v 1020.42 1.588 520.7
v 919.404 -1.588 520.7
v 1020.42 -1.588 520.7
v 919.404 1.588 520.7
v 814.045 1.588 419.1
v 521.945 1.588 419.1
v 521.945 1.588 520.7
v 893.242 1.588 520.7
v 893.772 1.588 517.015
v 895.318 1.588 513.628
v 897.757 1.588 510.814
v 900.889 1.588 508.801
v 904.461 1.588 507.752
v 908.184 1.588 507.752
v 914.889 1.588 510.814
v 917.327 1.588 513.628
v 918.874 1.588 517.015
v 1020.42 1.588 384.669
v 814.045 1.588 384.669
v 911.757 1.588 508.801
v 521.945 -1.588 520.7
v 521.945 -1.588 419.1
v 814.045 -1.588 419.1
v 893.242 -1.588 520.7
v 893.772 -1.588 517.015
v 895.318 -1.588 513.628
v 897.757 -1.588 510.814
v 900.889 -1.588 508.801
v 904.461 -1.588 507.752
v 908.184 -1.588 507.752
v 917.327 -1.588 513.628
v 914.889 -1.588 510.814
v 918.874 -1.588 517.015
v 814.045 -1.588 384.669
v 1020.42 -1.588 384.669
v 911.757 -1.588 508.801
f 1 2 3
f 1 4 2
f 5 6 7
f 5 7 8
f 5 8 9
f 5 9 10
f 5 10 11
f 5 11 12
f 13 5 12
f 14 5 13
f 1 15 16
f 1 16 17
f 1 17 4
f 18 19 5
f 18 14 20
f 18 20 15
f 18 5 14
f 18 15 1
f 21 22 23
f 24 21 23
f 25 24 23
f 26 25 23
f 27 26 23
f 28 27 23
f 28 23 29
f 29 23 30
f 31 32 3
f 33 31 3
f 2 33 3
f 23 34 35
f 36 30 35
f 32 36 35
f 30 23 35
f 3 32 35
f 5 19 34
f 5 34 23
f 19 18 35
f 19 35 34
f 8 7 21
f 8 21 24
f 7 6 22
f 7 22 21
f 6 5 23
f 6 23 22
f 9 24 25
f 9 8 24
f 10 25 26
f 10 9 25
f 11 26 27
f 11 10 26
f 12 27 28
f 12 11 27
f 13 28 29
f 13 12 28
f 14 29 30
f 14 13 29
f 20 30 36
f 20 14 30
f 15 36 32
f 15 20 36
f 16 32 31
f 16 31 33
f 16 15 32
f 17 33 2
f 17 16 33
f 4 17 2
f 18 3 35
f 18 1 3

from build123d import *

# Parameters (mm, degrees)
BOSS_EXTRUDE1_DEPTH = 1.5875


with BuildPart() as part:
    # Sketch1 → Boss-Extrude1 (new, symmetric)
    with BuildSketch(Plane(origin=(0, 0, 0), x_dir=(1, 0, 0), z_dir=(0, 1, 0))):
        with BuildLine():
            Line((1020.4196, -520.7), (1020.4196, -384.668661408))
            Line((1020.4196, -384.668661408), (1017.2446, -384.668661408))
            Line((1017.2446, -384.668661408), (814.0446, -384.668661408))
            Line((814.0446, -384.668661408), (814.0446, -419.1))
            Line((814.0446, -419.1), (525.1196, -419.1))
            Line((525.1196, -419.1), (521.9446, -419.1))
            Line((521.9446, -419.1), (521.9446, -520.7))
            Line((521.9446, -520.7), (525.1196, -520.7))
            Line((525.1196, -520.7), (893.2418, -520.7))
            ThreePointArc((893.2418, -520.7), (906.3228, -507.619), (919.4038, -520.7))
            Line((919.4038, -520.7), (1020.4196, -520.7))
        make_face()
    extrude(amount=BOSS_EXTRUDE1_DEPTH, both=True)


solid = part.part
